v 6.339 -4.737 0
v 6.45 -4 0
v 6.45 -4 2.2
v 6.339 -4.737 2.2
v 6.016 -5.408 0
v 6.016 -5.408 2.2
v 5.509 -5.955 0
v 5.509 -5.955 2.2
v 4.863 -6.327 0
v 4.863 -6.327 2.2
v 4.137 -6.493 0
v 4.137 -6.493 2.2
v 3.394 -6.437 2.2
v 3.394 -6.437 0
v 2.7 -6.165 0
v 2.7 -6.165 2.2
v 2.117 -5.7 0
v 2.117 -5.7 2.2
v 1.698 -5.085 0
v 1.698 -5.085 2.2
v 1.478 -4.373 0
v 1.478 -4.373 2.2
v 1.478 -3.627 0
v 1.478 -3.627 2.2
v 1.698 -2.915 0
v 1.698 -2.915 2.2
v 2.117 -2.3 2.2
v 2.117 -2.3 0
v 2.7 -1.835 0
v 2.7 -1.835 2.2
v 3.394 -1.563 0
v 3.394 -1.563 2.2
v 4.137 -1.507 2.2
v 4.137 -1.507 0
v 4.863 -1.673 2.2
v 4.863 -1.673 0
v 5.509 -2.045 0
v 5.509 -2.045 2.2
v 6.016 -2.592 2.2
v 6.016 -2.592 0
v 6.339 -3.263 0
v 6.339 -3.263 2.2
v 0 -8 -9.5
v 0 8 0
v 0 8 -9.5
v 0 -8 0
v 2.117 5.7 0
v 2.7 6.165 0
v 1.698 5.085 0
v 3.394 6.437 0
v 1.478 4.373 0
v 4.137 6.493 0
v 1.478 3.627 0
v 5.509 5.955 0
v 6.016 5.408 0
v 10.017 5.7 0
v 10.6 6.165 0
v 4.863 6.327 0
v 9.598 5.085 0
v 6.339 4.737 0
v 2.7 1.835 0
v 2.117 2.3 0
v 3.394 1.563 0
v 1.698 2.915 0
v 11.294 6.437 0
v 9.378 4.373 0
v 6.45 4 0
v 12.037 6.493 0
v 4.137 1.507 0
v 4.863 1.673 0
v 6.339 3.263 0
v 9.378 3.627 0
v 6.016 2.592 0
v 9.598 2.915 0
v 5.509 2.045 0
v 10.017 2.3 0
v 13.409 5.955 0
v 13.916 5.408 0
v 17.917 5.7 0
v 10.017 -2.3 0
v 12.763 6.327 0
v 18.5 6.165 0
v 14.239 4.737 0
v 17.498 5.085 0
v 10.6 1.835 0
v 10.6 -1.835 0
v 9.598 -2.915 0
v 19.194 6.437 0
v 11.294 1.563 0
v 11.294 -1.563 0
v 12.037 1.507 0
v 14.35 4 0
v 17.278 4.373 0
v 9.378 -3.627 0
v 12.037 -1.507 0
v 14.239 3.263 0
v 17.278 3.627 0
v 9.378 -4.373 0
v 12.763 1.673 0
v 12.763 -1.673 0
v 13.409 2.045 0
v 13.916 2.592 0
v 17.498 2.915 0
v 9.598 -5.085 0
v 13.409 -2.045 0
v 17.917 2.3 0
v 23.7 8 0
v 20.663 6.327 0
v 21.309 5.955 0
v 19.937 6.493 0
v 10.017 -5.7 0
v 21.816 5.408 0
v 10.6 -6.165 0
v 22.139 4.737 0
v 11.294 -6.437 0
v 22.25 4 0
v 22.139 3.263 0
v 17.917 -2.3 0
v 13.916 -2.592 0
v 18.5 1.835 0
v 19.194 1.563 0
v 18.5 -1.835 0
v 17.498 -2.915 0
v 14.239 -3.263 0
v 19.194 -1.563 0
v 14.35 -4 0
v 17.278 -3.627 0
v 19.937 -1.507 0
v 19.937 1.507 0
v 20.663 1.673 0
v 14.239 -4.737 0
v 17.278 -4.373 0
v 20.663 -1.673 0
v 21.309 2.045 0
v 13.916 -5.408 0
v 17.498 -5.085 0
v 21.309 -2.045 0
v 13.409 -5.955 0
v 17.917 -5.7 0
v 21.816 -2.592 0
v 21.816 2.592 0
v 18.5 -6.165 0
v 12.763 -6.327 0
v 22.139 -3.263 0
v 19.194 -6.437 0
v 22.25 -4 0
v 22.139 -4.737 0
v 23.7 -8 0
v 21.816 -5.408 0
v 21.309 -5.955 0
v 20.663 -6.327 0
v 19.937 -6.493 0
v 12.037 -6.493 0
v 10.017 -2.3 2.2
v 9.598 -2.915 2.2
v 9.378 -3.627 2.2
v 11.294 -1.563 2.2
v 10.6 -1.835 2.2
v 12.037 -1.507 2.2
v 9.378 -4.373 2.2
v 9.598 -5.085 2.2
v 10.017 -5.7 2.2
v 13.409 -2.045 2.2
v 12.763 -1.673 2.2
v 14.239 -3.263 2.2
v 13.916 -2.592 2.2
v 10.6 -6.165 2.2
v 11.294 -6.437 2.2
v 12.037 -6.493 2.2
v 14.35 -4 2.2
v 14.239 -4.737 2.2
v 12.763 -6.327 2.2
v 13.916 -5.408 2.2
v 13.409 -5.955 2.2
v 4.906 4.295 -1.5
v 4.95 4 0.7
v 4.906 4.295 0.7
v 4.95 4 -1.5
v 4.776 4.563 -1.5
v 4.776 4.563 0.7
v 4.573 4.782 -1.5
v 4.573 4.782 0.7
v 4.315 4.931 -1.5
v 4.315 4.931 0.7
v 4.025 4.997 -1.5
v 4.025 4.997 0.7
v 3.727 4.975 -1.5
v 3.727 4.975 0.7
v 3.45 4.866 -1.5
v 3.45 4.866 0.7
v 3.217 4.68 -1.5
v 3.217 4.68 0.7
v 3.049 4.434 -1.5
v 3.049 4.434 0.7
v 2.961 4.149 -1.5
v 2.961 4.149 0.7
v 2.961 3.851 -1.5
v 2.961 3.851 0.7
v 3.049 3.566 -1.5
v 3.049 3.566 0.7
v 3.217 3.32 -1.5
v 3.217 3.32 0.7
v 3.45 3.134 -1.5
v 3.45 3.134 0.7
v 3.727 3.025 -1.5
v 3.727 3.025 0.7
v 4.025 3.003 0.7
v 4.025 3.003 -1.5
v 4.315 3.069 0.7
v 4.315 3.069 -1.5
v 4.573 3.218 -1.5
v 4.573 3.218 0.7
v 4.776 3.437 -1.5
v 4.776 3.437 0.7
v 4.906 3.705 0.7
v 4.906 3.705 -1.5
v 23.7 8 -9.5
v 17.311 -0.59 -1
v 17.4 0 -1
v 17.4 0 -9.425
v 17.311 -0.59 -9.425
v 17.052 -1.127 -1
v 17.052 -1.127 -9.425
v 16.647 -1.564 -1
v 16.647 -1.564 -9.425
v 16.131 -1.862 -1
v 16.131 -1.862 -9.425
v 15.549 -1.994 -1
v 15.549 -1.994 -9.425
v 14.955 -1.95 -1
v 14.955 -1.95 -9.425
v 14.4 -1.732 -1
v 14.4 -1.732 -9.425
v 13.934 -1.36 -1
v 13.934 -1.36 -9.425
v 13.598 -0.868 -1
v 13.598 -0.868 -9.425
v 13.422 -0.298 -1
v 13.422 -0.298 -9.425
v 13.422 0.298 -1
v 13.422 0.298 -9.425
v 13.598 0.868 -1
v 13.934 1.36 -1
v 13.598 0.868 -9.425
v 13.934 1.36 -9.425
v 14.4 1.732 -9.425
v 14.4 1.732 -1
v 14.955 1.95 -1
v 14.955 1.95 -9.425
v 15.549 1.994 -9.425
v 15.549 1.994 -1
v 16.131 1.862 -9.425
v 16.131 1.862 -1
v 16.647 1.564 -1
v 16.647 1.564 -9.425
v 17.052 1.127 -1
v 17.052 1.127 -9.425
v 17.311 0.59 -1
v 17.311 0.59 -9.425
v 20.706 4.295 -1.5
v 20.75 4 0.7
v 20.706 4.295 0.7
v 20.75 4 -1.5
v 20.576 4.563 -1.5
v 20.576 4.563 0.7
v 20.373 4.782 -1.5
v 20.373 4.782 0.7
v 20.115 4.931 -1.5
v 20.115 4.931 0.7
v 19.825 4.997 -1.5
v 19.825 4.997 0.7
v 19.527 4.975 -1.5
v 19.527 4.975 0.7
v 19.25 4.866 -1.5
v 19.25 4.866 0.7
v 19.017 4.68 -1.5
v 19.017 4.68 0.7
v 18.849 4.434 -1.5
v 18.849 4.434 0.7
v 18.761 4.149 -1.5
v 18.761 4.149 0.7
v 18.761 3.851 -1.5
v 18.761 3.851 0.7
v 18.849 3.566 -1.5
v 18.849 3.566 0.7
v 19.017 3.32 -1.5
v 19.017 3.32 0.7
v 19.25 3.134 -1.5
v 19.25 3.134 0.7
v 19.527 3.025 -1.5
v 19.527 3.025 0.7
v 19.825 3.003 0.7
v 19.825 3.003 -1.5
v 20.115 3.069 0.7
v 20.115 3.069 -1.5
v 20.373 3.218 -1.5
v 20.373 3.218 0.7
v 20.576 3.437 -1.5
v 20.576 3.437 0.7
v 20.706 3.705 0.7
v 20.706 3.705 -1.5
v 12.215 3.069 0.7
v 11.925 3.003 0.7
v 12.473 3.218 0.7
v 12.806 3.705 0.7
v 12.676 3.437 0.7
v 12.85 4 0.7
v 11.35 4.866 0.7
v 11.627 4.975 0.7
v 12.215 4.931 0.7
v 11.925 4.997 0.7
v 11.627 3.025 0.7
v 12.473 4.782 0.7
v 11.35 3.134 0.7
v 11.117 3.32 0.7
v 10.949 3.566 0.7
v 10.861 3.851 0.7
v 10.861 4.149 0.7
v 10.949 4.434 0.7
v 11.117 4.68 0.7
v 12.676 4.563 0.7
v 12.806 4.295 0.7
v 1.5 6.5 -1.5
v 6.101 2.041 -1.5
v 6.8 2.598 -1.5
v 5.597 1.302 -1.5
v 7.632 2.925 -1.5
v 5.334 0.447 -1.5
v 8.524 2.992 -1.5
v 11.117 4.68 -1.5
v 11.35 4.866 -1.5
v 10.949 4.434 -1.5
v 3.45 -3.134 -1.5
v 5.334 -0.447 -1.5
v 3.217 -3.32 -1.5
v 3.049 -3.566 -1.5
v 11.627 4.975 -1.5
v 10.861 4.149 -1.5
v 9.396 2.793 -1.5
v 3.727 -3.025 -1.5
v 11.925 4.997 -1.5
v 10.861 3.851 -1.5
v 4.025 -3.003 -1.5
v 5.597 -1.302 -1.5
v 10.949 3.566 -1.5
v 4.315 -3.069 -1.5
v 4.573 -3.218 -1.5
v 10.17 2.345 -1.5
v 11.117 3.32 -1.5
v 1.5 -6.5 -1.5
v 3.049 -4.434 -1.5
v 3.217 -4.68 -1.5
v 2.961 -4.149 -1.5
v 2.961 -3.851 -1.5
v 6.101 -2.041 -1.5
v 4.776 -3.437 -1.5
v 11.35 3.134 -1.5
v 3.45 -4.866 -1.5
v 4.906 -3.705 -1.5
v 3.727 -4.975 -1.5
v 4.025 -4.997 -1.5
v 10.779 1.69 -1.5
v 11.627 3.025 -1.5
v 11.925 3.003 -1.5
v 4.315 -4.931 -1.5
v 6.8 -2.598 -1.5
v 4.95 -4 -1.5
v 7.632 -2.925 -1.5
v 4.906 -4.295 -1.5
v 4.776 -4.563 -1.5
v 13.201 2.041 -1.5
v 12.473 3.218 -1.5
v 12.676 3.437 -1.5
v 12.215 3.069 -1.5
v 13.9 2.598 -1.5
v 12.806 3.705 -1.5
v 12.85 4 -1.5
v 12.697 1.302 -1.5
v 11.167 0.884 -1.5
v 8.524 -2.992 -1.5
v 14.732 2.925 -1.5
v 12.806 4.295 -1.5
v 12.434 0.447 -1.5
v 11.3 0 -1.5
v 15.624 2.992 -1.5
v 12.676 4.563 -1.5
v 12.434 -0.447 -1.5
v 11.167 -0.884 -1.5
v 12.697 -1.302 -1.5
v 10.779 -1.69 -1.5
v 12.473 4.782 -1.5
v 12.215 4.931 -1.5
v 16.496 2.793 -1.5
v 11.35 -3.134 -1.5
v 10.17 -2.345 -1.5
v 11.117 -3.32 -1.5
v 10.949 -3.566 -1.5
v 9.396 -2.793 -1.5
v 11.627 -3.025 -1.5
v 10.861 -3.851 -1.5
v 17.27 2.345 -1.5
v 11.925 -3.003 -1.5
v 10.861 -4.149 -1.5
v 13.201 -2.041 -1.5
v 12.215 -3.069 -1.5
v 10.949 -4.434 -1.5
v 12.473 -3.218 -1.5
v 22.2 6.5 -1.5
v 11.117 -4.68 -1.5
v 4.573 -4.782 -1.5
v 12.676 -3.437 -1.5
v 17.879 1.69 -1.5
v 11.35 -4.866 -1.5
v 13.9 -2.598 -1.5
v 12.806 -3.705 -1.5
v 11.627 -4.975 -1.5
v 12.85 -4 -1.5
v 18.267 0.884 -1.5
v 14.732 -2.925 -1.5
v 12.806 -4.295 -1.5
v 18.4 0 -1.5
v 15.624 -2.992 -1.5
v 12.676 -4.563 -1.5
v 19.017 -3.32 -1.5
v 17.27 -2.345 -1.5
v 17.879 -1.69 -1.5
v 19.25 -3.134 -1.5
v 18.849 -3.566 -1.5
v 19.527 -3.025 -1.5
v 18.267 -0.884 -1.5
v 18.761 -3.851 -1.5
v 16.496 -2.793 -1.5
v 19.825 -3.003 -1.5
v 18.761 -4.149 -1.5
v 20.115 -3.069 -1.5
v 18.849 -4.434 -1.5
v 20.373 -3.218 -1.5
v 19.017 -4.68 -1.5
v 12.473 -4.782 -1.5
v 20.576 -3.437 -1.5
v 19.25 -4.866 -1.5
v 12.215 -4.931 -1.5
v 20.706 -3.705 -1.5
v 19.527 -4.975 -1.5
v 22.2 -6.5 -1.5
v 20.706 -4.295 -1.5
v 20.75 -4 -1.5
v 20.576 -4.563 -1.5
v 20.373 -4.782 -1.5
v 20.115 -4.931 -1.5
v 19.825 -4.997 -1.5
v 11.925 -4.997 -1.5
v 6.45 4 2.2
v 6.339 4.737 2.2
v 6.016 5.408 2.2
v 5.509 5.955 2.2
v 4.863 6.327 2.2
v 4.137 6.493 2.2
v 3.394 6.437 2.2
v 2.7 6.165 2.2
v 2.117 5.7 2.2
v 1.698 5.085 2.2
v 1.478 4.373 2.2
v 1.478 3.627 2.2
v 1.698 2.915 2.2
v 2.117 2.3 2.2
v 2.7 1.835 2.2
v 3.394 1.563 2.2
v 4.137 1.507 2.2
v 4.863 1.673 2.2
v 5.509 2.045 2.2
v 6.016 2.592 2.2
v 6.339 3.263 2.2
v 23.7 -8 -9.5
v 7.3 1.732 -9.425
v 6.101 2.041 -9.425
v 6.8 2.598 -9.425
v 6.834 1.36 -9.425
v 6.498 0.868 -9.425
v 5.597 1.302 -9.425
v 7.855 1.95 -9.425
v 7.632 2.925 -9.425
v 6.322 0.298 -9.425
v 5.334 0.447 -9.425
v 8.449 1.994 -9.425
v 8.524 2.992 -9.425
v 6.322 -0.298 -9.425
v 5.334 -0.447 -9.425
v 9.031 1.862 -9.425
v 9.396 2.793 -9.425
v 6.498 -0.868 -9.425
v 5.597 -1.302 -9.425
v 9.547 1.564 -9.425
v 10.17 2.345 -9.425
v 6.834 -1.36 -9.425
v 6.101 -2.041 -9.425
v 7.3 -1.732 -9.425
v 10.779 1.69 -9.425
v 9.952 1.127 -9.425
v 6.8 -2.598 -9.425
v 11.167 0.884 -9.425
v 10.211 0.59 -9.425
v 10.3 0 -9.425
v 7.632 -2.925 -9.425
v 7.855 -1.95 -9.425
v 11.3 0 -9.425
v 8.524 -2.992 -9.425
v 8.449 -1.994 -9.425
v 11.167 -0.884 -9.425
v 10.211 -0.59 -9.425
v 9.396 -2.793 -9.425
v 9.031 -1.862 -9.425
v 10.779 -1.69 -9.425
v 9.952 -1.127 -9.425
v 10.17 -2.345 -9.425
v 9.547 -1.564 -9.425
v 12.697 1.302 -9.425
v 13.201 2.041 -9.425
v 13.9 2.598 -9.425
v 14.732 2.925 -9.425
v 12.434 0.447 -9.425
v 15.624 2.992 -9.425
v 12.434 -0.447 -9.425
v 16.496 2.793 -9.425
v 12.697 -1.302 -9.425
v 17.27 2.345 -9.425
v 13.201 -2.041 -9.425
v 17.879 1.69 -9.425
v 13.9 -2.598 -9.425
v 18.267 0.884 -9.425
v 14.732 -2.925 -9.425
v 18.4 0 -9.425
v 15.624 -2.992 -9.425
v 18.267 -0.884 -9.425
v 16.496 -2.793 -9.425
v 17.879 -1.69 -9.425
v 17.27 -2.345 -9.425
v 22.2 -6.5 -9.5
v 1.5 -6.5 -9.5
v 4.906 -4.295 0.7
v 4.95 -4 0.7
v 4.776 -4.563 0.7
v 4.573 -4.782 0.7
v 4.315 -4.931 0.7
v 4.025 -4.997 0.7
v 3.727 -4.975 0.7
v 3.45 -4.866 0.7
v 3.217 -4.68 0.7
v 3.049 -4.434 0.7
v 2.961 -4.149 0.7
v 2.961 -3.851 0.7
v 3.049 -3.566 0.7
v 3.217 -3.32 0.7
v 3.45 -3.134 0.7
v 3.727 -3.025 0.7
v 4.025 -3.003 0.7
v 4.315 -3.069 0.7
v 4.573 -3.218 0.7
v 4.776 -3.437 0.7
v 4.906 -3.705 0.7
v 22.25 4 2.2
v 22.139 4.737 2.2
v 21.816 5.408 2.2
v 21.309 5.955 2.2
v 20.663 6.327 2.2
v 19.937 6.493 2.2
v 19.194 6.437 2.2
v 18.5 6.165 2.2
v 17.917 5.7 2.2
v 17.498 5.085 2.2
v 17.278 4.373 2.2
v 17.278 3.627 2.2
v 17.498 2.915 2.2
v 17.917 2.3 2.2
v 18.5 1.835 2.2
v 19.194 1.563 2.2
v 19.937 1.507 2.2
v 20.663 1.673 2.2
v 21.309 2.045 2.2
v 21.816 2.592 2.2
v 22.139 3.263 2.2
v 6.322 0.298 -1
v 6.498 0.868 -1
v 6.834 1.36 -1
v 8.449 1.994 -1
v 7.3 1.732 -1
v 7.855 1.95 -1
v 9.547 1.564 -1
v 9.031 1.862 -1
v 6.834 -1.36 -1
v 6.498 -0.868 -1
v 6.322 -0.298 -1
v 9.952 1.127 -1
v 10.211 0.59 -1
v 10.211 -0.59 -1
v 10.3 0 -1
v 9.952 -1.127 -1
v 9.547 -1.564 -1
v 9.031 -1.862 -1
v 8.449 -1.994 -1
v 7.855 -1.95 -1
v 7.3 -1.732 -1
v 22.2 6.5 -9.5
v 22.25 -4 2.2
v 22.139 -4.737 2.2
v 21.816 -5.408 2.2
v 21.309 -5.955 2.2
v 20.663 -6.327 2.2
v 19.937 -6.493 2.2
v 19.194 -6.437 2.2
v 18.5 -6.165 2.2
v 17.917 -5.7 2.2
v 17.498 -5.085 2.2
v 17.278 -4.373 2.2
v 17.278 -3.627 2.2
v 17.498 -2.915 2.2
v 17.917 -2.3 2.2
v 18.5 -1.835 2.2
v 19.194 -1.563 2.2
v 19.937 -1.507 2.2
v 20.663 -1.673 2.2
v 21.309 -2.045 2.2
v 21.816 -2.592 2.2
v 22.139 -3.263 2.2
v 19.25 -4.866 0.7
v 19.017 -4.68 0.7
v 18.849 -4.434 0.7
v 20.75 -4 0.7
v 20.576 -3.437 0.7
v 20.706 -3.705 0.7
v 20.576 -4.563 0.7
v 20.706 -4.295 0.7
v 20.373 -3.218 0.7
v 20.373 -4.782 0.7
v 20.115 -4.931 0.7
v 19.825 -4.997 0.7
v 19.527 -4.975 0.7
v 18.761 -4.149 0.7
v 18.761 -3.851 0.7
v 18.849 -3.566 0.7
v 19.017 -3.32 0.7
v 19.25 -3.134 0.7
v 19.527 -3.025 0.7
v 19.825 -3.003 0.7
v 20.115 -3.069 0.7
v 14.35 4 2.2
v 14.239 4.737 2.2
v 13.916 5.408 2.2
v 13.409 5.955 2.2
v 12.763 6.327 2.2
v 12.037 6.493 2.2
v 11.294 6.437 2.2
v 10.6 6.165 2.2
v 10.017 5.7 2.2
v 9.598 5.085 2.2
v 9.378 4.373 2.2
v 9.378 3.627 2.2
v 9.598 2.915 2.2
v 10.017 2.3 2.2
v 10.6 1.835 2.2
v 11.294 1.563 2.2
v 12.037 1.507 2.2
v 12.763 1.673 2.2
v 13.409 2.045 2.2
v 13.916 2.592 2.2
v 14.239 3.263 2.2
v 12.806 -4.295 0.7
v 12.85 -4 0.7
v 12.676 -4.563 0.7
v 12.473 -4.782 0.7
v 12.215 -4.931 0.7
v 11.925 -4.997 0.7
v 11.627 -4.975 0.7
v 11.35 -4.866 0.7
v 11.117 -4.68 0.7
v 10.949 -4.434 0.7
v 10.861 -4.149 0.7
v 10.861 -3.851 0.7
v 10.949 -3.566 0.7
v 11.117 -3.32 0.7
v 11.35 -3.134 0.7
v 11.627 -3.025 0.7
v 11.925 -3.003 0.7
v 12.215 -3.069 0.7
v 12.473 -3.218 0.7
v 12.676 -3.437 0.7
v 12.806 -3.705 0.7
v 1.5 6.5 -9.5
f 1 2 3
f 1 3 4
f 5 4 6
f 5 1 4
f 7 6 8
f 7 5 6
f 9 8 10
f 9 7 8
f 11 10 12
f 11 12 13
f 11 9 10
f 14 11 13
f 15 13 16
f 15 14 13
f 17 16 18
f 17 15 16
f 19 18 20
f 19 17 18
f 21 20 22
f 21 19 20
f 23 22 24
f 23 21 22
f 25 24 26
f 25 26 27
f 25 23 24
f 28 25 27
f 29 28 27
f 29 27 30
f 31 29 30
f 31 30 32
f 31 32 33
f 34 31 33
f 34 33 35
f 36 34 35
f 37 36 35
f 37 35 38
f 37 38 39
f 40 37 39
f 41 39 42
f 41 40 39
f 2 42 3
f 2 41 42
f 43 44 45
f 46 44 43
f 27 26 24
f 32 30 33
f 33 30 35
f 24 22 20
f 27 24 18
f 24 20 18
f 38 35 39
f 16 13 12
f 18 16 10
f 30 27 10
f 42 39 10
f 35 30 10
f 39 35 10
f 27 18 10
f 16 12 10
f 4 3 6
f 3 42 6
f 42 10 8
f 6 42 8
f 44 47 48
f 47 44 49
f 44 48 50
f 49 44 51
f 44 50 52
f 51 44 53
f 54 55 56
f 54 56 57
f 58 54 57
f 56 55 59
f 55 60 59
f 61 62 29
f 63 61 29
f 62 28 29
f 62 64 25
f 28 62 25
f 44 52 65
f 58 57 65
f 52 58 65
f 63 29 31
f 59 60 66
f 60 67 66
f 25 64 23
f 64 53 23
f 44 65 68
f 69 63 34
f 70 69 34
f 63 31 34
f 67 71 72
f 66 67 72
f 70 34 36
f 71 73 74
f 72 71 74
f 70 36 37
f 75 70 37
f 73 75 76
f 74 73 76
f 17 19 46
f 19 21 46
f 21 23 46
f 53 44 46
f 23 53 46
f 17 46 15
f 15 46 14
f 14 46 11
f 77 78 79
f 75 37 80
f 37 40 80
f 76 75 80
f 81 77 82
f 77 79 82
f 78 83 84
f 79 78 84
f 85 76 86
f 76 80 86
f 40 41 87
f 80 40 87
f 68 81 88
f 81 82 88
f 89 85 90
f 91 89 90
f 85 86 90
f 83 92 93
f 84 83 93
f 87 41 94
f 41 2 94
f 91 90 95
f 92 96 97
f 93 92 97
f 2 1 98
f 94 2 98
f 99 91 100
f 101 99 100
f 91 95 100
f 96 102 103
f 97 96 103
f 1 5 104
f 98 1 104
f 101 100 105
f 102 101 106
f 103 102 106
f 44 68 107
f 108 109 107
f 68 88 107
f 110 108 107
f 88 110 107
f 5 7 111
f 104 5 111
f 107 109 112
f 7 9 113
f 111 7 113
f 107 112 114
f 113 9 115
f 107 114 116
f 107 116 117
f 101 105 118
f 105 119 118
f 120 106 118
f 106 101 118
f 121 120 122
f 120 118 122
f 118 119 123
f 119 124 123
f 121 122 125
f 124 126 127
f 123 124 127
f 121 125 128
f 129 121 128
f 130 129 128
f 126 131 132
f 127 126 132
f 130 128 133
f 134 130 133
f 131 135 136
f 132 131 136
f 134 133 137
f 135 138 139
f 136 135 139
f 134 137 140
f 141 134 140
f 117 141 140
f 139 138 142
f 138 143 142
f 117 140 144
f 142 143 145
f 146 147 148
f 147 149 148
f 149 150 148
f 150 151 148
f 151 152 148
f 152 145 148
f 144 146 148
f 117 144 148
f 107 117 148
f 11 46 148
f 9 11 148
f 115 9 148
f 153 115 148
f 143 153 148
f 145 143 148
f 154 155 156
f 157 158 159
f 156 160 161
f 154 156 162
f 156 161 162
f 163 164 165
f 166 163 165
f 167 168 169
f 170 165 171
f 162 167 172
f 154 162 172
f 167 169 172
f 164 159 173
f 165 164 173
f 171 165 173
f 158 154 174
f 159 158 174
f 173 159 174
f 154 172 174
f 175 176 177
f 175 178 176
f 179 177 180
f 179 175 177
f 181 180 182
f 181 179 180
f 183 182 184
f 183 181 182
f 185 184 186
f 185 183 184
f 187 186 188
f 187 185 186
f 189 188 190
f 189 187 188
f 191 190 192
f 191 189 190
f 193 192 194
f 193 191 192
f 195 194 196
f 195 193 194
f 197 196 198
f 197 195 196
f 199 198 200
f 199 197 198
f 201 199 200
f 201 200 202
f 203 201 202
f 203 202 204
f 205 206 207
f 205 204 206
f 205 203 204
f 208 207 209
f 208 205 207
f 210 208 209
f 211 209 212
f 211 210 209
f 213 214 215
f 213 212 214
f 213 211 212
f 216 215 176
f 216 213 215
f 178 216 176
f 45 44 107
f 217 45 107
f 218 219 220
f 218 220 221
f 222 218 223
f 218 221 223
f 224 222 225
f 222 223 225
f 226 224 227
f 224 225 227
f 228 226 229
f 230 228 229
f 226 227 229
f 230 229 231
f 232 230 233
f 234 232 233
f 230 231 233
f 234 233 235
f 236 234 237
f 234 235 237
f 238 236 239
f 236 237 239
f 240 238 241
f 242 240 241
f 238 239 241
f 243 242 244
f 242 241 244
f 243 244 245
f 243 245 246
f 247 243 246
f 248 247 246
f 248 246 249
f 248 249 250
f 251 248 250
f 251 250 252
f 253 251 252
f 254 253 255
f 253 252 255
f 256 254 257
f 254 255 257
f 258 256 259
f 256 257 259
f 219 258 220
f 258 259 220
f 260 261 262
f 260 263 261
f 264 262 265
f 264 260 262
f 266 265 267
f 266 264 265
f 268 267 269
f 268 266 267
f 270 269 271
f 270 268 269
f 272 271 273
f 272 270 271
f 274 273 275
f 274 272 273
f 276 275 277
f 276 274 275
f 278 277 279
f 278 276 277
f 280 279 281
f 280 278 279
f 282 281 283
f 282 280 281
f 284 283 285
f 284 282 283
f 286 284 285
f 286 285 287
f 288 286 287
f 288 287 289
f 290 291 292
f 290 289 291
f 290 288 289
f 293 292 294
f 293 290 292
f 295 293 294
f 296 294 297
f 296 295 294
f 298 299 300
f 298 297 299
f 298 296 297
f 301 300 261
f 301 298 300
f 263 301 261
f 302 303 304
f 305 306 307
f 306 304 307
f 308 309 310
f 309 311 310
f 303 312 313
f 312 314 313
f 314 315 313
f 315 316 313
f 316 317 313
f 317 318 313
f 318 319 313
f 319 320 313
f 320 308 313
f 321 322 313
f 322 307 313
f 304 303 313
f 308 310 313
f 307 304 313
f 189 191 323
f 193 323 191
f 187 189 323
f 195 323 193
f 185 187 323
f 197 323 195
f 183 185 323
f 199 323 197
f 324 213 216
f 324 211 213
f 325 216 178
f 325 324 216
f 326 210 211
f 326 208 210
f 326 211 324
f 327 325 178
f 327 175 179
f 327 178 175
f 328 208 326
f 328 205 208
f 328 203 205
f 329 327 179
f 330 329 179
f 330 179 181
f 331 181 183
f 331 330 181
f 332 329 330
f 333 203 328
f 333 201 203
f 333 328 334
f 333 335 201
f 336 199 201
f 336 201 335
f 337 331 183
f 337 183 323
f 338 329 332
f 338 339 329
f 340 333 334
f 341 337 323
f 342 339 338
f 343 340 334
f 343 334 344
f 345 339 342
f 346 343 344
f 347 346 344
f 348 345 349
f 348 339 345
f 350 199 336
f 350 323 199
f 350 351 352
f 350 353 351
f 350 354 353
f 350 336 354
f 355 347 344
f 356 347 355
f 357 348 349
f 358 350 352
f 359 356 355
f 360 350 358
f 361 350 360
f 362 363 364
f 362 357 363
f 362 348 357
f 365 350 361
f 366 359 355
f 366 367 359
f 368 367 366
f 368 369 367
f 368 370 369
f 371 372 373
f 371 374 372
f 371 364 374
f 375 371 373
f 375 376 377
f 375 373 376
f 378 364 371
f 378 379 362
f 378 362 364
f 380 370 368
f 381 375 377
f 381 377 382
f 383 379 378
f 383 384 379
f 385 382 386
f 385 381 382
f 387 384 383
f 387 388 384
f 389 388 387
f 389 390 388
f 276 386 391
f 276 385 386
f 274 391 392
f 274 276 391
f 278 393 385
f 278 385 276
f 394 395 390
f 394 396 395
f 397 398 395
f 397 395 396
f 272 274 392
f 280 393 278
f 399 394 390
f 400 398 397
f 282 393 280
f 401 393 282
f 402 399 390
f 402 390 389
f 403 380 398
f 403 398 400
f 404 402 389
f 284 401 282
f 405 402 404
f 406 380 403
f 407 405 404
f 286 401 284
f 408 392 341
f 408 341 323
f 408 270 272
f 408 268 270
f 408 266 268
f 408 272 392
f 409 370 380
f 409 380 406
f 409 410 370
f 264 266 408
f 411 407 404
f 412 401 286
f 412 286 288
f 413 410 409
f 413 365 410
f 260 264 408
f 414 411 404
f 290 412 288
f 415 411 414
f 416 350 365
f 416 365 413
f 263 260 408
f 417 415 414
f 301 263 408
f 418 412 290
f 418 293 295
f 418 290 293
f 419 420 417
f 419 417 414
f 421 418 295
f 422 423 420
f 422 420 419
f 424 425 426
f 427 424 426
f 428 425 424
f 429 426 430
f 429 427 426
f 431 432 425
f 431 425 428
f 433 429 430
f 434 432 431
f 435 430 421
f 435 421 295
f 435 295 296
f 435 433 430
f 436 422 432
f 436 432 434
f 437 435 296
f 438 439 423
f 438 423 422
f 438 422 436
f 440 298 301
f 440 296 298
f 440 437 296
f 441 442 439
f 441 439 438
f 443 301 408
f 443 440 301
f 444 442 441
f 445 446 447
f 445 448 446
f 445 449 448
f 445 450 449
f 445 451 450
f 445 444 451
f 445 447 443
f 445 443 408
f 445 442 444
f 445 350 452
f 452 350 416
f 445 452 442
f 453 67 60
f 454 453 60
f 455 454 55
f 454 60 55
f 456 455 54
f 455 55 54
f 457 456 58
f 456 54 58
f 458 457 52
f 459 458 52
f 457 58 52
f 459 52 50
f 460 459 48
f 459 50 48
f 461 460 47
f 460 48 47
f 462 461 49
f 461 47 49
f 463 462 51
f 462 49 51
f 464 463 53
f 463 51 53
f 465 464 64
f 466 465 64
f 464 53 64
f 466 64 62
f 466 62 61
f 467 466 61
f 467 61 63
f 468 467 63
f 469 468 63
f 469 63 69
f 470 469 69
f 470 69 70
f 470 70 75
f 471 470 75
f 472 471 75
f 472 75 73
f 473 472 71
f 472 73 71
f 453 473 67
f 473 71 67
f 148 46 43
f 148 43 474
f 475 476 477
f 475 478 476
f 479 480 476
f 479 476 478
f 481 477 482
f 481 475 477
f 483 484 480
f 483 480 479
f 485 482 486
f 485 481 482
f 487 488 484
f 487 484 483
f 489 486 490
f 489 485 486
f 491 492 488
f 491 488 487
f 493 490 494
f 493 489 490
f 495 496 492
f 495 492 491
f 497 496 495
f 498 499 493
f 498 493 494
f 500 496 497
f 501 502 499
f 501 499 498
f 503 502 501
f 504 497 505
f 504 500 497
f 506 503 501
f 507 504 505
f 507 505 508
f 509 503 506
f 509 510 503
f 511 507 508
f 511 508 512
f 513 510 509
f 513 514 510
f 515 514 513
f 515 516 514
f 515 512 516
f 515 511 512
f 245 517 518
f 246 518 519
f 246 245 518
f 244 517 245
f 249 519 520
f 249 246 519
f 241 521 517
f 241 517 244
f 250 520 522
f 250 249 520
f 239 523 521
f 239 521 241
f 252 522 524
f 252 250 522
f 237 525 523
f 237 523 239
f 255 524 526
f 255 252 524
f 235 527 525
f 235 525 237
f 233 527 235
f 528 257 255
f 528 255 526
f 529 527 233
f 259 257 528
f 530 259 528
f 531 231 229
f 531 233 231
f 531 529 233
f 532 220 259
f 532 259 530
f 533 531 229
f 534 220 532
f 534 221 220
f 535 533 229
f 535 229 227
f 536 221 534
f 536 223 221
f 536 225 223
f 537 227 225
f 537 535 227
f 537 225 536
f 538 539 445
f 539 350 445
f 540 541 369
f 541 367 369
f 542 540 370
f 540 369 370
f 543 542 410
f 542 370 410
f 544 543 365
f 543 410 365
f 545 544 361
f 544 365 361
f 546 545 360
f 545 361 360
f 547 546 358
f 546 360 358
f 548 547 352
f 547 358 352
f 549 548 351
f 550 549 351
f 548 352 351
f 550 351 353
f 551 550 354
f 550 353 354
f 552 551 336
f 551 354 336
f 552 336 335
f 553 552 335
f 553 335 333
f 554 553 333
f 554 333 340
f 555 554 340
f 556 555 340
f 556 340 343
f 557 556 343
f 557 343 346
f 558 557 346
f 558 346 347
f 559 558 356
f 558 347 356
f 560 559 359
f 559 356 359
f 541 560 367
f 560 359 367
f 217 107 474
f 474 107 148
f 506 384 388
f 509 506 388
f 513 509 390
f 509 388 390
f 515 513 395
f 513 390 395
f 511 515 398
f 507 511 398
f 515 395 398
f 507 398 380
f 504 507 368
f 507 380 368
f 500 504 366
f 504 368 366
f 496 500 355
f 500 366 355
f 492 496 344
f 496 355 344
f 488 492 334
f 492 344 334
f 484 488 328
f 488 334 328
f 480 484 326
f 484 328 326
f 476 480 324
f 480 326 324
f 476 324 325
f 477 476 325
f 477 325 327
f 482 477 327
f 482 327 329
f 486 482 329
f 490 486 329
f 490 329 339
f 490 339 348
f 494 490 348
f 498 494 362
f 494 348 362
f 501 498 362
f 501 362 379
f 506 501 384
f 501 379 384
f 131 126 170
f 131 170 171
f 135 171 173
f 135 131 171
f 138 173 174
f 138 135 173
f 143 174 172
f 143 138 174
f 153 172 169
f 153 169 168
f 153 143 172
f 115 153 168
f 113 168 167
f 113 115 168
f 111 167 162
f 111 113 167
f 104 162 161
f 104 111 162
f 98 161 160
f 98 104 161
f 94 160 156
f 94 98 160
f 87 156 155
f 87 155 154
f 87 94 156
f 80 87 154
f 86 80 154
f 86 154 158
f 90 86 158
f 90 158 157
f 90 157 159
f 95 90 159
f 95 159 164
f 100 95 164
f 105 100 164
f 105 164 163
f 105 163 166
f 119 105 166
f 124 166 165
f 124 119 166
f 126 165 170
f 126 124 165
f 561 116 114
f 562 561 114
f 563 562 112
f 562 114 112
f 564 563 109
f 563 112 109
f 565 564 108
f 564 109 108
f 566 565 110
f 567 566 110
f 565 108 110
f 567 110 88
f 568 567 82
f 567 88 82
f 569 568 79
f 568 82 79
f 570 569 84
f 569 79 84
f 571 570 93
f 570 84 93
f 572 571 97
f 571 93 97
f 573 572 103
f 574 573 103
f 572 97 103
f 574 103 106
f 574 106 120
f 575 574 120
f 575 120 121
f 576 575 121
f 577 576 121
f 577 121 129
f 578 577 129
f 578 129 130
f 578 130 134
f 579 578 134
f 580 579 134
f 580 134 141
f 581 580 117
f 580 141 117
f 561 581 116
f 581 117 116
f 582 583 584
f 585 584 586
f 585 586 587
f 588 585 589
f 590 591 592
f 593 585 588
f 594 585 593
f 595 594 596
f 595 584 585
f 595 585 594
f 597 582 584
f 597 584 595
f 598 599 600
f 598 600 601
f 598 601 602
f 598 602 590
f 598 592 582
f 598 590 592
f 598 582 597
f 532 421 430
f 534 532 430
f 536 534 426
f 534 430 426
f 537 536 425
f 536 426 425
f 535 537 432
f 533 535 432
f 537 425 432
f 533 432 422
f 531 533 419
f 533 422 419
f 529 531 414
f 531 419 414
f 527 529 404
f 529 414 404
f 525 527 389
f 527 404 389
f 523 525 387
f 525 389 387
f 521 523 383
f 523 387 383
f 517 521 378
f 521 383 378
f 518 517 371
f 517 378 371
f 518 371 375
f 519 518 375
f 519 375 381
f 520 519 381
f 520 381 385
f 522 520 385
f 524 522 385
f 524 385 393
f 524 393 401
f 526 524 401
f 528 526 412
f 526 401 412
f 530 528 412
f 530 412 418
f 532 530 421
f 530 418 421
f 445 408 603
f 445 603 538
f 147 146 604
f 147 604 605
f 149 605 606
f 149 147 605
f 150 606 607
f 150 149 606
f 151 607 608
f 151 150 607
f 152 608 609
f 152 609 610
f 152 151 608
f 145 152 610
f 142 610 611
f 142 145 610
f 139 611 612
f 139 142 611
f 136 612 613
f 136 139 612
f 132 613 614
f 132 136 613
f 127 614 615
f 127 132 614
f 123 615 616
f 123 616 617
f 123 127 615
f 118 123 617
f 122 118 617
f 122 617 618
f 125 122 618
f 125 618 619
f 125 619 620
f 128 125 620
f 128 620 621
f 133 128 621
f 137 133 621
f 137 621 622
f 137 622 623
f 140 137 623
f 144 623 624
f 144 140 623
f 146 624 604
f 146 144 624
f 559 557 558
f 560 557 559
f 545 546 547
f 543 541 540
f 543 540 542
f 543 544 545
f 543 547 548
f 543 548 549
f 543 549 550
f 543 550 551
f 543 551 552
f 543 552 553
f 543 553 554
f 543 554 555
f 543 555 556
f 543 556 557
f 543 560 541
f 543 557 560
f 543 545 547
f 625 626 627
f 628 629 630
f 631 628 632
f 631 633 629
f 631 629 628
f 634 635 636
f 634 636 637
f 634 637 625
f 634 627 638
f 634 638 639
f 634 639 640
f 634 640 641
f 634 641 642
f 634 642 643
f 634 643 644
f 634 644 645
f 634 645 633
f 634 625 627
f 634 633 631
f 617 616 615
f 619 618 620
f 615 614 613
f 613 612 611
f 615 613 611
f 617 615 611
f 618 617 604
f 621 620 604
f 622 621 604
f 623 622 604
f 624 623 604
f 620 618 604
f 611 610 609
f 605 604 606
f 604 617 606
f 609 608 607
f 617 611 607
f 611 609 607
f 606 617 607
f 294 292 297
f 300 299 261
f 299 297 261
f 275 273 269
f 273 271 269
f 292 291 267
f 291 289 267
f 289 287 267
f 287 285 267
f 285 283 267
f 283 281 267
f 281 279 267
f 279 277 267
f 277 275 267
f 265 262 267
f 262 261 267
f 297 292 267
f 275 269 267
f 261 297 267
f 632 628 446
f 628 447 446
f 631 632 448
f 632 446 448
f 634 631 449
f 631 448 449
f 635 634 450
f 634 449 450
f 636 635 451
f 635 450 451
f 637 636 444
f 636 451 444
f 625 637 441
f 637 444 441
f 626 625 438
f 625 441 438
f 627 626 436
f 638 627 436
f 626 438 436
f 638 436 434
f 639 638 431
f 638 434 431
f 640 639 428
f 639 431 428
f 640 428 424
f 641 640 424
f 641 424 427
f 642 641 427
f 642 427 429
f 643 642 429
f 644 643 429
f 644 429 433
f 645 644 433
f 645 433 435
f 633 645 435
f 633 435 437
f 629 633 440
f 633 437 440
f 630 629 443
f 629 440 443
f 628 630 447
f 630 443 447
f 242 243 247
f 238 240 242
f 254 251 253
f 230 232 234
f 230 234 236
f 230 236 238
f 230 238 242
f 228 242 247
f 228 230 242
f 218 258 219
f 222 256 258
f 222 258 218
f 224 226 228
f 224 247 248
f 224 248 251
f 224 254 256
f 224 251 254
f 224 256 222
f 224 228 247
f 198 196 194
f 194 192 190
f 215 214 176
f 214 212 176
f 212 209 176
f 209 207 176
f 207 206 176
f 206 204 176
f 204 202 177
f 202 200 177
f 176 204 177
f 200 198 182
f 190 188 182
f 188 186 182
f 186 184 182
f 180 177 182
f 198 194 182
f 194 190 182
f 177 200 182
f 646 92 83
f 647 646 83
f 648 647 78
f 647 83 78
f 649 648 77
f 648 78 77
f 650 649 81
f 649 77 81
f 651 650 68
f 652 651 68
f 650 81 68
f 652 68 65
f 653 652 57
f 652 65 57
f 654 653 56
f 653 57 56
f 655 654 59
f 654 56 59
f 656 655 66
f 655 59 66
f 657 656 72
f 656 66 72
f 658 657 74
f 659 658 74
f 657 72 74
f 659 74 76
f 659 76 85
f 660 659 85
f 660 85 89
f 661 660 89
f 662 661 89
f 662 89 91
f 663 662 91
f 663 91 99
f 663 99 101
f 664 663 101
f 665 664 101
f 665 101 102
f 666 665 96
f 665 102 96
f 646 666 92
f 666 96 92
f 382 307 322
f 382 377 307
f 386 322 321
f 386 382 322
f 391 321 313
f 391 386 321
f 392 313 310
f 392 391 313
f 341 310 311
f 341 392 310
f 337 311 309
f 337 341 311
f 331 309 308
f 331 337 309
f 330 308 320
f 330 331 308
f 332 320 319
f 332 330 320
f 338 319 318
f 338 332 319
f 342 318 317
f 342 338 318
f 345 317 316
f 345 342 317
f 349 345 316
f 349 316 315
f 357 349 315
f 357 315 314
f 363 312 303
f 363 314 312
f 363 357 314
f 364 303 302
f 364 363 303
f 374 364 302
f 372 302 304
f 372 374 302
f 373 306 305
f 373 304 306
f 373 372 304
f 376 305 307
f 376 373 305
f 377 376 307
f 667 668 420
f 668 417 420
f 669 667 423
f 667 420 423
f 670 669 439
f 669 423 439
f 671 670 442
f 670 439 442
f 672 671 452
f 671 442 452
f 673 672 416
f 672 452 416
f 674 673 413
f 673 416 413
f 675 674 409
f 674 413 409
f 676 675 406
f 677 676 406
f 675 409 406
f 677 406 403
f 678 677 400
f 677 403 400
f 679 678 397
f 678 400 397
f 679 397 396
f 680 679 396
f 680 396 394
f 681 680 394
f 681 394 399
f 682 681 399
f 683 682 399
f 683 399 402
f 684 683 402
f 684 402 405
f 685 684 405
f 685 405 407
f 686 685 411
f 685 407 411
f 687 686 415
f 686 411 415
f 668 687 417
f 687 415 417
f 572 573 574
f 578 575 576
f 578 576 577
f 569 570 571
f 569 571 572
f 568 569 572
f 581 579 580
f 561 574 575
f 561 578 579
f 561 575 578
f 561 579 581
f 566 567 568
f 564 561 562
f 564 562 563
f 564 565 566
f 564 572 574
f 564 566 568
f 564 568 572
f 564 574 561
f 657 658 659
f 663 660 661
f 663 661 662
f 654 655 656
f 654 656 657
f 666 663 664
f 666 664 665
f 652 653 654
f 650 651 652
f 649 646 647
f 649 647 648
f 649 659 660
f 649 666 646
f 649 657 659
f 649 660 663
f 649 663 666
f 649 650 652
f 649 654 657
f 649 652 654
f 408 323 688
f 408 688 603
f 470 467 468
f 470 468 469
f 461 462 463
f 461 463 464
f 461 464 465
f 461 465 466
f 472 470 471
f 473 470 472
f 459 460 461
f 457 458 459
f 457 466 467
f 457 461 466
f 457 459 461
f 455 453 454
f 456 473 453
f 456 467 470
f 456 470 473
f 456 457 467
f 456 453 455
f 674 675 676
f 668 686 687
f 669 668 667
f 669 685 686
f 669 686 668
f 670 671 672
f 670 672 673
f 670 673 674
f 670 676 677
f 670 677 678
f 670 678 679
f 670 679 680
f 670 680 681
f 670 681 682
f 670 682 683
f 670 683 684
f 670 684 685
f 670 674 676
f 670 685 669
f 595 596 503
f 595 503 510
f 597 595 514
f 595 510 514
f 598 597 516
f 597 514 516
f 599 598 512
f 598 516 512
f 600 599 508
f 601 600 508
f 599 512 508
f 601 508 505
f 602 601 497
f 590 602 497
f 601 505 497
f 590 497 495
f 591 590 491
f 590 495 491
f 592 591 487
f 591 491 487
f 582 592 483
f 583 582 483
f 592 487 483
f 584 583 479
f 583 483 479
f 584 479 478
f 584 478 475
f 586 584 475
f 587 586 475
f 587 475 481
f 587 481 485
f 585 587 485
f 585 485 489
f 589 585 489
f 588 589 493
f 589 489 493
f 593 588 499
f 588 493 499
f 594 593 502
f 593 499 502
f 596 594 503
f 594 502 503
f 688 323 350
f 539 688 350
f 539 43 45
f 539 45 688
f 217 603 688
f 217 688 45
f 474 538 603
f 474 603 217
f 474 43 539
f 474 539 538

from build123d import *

# Parameters (mm, degrees)
F0_W        = 23.7
F0_H        = 8
F0_R        = 2.5
F1_DEPTH    = 9.5
F2_DEPTH    = 2.2
F4_T        = -1.5
F5_R        = 3
F6_DEPTH    = 7.9248
F7_T        = 1
F7_T3_DEPTH = 10
F7_T5_DEPTH = 15
F7_T7_DEPTH = 22.7


# Not quite as in the source:
# - a shell that OpenCascade refuses in one call is made with other operations: the cavity is built on its own and cut out


with BuildPart() as f1:
    # F0 (on Top) → F1 (new body)
    with BuildSketch(Plane.XY):
        with Locations((11.85, 4)):
            Rectangle(F0_W, F0_H)
        with Locations((3.95, 4)):
            Circle(F0_R, mode=Mode.SUBTRACT)
        with Locations((11.85, 4)):
            Circle(F0_R, mode=Mode.SUBTRACT)
        with Locations((19.75, 4)):
            Circle(F0_R, mode=Mode.SUBTRACT)
        with Locations((19.75, 4)):
            Circle(F0_R)
        with Locations((11.85, 4)):
            Circle(F0_R)
        with Locations((3.95, 4)):
            Circle(F0_R)
    extrude(amount=-F1_DEPTH)

    # F0 (on Top) → F2 (join)
    with BuildSketch(Plane.XY):
        with Locations((3.95, 4)):
            Circle(F0_R)
        with Locations((11.85, 4)):
            Circle(F0_R)
        with Locations((19.75, 4)):
            Circle(F0_R)
    extrude(amount=F2_DEPTH)

    # F3: F1 across face


with BuildPart() as f1_1:
    add(f1.part)
    add(f1.part.mirror(Plane(origin=(11.85, 0, -4.75), x_dir=(1, 0, 0), z_dir=(0, -1, 0))))

    # F4
    f4_openings = [f1_1.faces().sort_by_distance(p)[0] for p in [
        (11.85, 0, -9.5),
    ]]
    offset(amount=F4_T, openings=f4_openings, kind=Kind.INTERSECTION)

    # F5 (on face) → F6 (join)
    with BuildSketch(Plane(origin=(0, 0, -1.5), x_dir=(1, 0, 0), z_dir=(0, 0, -1))):
        with Locations((8.3, 0)):
            Circle(F5_R)
        with Locations((15.4, 0)):
            Circle(F5_R)
    extrude(amount=F6_DEPTH)

    # F7: shell of thickness 1, made by hand


with BuildPart() as f7_core1:
    # F7_t2: copy of F1
    add(f1_1.part)

    # the walls: a layer under each face that stays
    f7_faces = [f7_core1.faces().sort_by_distance(p)[0] for p in [
        (0, 0, -4.75),
        (11.85, 8, -4.75),
        (1.6928571429, -6.8571428571, -9.5),
        (11.85, -8, -4.75),
        (11.85, 0, 0),
        (23.7, 0, -4.75),
        (1.5, 0, -5.5),
        (11.85, 6.5, -5.5),
        (22.2, 0, -5.5),
        (11.85, -6.5, -5.5),
        (1.45, 4, 1.1),
        (9.35, 4, 1.1),
        (17.25, 4, 1.1),
        (17.25, -4, 1.1),
        (1.45, -4, 1.1),
        (9.35, -4, 1.1),
        (11.85, 0, -1.5),
        (3.95, 4, 2.2),
        (11.85, 4, 2.2),
        (19.75, 4, 2.2),
        (19.75, -4, 2.2),
        (3.95, -4, 2.2),
        (11.85, -4, 2.2),
        (2.95, -4, -0.4),
        (10.85, -4, -0.4),
        (18.75, -4, -0.4),
        (5.3, 0, -5.4624),
        (2.95, 4, -0.4),
        (12.4, 0, -5.4624),
        (10.85, 4, -0.4),
        (18.75, 4, -0.4),
        (3.95, -4, 0.7),
        (11.85, -4, 0.7),
        (19.75, -4, 0.7),
        (3.95, 4, 0.7),
        (11.85, 4, 0.7),
        (19.75, 4, 0.7),
    ]]
    thicken(f7_faces, amount=-F7_T, mode=Mode.SUBTRACT)

    # F7_s4 → F7_t3 (cut)
    with BuildSketch(Plane.XY.offset(-10.5)):
        Polygon((1.51, 6.49), (0.5, 6.5), (0.5, 7.5), (1.5, 7.5), align=None)
        Polygon((1.51, -6.49), (0.5, -6.5), (0.5, -7.5), (1.5, -7.5), align=None)
        Polygon((22.19, 6.49), (22.2, 7.5), (23.2, 7.5), (23.2, 6.5), align=None)
        Polygon((22.19, -6.49), (23.2, -6.5), (23.2, -7.5), (22.2, -7.5), align=None)
    extrude(amount=F7_T3_DEPTH, mode=Mode.SUBTRACT)

    # F7_s6 → F7_t5 (cut)
    with BuildSketch(Plane.XZ.offset(-7.5)):
        Polygon((1.51, -1.51), (0.5, -1.5), (0.5, -0.5), (1.5, -0.5), align=None)
        Polygon((22.19, -1.51), (23.2, -1.5), (23.2, -0.5), (22.2, -0.5), align=None)
    extrude(amount=F7_T5_DEPTH, mode=Mode.SUBTRACT)

    # F7_s8 → F7_t7 (cut)
    with BuildSketch(Plane.YZ.offset(0.5)):
        Polygon((6.49, -1.51), (7.5, -1.5), (7.5, -0.5), (6.5, -0.5), align=None)
        Polygon((-6.49, -1.51), (-7.5, -1.5), (-7.5, -0.5), (-6.5, -0.5), align=None)
    extrude(amount=F7_T7_DEPTH, mode=Mode.SUBTRACT)

    # F7_s9 → F7_t10 (revolve, cut)
    with BuildSketch(Plane.XZ.offset(-4)):
        Polygon((6.46, 0.01), (6.45, -1), (5.45, -1), (5.45, 0), align=None)
    revolve(axis=Axis((3.95, 4, 0), (0, 0, 1)), mode=Mode.SUBTRACT)

    # F7_s11 → F7_t12 (revolve, cut)
    with BuildSketch(Plane.XZ.offset(-4)):
        Polygon((14.36, 0.01), (14.35, -1), (13.35, -1), (13.35, 0), align=None)
    revolve(axis=Axis((11.85, 4, 0), (0, 0, 1)), mode=Mode.SUBTRACT)

    # F7_s13 → F7_t14 (revolve, cut)
    with BuildSketch(Plane.XZ.offset(-4)):
        Polygon((22.26, 0.01), (22.25, -1), (21.25, -1), (21.25, 0), align=None)
    revolve(axis=Axis((19.75, 4, 0), (0, 0, 1)), mode=Mode.SUBTRACT)

    # F7_s15 → F7_t16 (revolve, cut)
    with BuildSketch(Plane.XZ.offset(4)):
        Polygon((22.26, 0.01), (22.25, -1), (21.25, -1), (21.25, 0), align=None)
    revolve(axis=Axis((19.75, -4, 0), (0, 0, -1)), mode=Mode.SUBTRACT)

    # F7_s17 → F7_t18 (revolve, cut)
    with BuildSketch(Plane.XZ.offset(4)):
        Polygon((6.46, 0.01), (6.45, -1), (5.45, -1), (5.45, 0), align=None)
    revolve(axis=Axis((3.95, -4, 0), (0, 0, -1)), mode=Mode.SUBTRACT)

    # F7_s19 → F7_t20 (revolve, cut)
    with BuildSketch(Plane.XZ.offset(4)):
        Polygon((14.36, 0.01), (14.35, -1), (13.35, -1), (13.35, 0), align=None)
    revolve(axis=Axis((11.85, -4, 0), (0, 0, -1)), mode=Mode.SUBTRACT)

    # F7_s21 → F7_t22 (revolve, cut)
    with BuildSketch(Plane.XZ):
        Polygon((11.31, -1.51), (11.3, -0.5), (10.3, -0.5), (10.3, -1.5), align=None)
    revolve(axis=Axis((8.3, 0, -1.5), (0, 0, -1)), mode=Mode.SUBTRACT)

    # F7_s23 → F7_t24 (revolve, cut)
    with BuildSketch(Plane.XZ):
        Polygon((18.41, -1.51), (18.4, -0.5), (17.4, -0.5), (17.4, -1.5), align=None)
    revolve(axis=Axis((15.4, 0, -1.5), (0, 0, -1)), mode=Mode.SUBTRACT)

    # F7_s25 → F7_t26 (revolve, cut)
    with BuildSketch(Plane.XZ.offset(4)):
        Polygon((4.94, 0.69), (5.95, 0.7), (5.95, 1.7), (4.95, 1.7), align=None)
    revolve(axis=Axis((3.95, -4, 0.7), (0, 0, -1)), mode=Mode.SUBTRACT)

    # F7_s27 → F7_t28 (revolve, cut)
    with BuildSketch(Plane.XZ.offset(4)):
        Polygon((12.84, 0.69), (13.85, 0.7), (13.85, 1.7), (12.85, 1.7), align=None)
    revolve(axis=Axis((11.85, -4, 0.7), (0, 0, -1)), mode=Mode.SUBTRACT)

    # F7_s29 → F7_t30 (revolve, cut)
    with BuildSketch(Plane.XZ.offset(4)):
        Polygon((20.74, 0.69), (21.75, 0.7), (21.75, 1.7), (20.75, 1.7), align=None)
    revolve(axis=Axis((19.75, -4, 0.7), (0, 0, -1)), mode=Mode.SUBTRACT)

    # F7_s31 → F7_t32 (revolve, cut)
    with BuildSketch(Plane.XZ.offset(-4)):
        Polygon((4.94, 0.69), (5.95, 0.7), (5.95, 1.7), (4.95, 1.7), align=None)
    revolve(axis=Axis((3.95, 4, 0.7), (0, 0, -1)), mode=Mode.SUBTRACT)

    # F7_s33 → F7_t34 (revolve, cut)
    with BuildSketch(Plane.XZ.offset(-4)):
        Polygon((12.84, 0.69), (13.85, 0.7), (13.85, 1.7), (12.85, 1.7), align=None)
    revolve(axis=Axis((11.85, 4, 0.7), (0, 0, -1)), mode=Mode.SUBTRACT)

    # F7_s35 → F7_t36 (revolve, cut)
    with BuildSketch(Plane.XZ.offset(-4)):
        Polygon((20.74, 0.69), (21.75, 0.7), (21.75, 1.7), (20.75, 1.7), align=None)
    revolve(axis=Axis((19.75, 4, 0.7), (0, 0, -1)), mode=Mode.SUBTRACT)


with BuildPart() as f1_2:
    add(f1_1.part)

    # what is left inside the walls is the cavity
    f7_cavity = [f7_core1.part.solids().sort_by_distance(p)[0] for p in [
        (13.41, 0, -3.808267),
        (6.31, 0, -3.808267),
    ]]
    add(f7_cavity, mode=Mode.SUBTRACT)


solid = f1_2.part
